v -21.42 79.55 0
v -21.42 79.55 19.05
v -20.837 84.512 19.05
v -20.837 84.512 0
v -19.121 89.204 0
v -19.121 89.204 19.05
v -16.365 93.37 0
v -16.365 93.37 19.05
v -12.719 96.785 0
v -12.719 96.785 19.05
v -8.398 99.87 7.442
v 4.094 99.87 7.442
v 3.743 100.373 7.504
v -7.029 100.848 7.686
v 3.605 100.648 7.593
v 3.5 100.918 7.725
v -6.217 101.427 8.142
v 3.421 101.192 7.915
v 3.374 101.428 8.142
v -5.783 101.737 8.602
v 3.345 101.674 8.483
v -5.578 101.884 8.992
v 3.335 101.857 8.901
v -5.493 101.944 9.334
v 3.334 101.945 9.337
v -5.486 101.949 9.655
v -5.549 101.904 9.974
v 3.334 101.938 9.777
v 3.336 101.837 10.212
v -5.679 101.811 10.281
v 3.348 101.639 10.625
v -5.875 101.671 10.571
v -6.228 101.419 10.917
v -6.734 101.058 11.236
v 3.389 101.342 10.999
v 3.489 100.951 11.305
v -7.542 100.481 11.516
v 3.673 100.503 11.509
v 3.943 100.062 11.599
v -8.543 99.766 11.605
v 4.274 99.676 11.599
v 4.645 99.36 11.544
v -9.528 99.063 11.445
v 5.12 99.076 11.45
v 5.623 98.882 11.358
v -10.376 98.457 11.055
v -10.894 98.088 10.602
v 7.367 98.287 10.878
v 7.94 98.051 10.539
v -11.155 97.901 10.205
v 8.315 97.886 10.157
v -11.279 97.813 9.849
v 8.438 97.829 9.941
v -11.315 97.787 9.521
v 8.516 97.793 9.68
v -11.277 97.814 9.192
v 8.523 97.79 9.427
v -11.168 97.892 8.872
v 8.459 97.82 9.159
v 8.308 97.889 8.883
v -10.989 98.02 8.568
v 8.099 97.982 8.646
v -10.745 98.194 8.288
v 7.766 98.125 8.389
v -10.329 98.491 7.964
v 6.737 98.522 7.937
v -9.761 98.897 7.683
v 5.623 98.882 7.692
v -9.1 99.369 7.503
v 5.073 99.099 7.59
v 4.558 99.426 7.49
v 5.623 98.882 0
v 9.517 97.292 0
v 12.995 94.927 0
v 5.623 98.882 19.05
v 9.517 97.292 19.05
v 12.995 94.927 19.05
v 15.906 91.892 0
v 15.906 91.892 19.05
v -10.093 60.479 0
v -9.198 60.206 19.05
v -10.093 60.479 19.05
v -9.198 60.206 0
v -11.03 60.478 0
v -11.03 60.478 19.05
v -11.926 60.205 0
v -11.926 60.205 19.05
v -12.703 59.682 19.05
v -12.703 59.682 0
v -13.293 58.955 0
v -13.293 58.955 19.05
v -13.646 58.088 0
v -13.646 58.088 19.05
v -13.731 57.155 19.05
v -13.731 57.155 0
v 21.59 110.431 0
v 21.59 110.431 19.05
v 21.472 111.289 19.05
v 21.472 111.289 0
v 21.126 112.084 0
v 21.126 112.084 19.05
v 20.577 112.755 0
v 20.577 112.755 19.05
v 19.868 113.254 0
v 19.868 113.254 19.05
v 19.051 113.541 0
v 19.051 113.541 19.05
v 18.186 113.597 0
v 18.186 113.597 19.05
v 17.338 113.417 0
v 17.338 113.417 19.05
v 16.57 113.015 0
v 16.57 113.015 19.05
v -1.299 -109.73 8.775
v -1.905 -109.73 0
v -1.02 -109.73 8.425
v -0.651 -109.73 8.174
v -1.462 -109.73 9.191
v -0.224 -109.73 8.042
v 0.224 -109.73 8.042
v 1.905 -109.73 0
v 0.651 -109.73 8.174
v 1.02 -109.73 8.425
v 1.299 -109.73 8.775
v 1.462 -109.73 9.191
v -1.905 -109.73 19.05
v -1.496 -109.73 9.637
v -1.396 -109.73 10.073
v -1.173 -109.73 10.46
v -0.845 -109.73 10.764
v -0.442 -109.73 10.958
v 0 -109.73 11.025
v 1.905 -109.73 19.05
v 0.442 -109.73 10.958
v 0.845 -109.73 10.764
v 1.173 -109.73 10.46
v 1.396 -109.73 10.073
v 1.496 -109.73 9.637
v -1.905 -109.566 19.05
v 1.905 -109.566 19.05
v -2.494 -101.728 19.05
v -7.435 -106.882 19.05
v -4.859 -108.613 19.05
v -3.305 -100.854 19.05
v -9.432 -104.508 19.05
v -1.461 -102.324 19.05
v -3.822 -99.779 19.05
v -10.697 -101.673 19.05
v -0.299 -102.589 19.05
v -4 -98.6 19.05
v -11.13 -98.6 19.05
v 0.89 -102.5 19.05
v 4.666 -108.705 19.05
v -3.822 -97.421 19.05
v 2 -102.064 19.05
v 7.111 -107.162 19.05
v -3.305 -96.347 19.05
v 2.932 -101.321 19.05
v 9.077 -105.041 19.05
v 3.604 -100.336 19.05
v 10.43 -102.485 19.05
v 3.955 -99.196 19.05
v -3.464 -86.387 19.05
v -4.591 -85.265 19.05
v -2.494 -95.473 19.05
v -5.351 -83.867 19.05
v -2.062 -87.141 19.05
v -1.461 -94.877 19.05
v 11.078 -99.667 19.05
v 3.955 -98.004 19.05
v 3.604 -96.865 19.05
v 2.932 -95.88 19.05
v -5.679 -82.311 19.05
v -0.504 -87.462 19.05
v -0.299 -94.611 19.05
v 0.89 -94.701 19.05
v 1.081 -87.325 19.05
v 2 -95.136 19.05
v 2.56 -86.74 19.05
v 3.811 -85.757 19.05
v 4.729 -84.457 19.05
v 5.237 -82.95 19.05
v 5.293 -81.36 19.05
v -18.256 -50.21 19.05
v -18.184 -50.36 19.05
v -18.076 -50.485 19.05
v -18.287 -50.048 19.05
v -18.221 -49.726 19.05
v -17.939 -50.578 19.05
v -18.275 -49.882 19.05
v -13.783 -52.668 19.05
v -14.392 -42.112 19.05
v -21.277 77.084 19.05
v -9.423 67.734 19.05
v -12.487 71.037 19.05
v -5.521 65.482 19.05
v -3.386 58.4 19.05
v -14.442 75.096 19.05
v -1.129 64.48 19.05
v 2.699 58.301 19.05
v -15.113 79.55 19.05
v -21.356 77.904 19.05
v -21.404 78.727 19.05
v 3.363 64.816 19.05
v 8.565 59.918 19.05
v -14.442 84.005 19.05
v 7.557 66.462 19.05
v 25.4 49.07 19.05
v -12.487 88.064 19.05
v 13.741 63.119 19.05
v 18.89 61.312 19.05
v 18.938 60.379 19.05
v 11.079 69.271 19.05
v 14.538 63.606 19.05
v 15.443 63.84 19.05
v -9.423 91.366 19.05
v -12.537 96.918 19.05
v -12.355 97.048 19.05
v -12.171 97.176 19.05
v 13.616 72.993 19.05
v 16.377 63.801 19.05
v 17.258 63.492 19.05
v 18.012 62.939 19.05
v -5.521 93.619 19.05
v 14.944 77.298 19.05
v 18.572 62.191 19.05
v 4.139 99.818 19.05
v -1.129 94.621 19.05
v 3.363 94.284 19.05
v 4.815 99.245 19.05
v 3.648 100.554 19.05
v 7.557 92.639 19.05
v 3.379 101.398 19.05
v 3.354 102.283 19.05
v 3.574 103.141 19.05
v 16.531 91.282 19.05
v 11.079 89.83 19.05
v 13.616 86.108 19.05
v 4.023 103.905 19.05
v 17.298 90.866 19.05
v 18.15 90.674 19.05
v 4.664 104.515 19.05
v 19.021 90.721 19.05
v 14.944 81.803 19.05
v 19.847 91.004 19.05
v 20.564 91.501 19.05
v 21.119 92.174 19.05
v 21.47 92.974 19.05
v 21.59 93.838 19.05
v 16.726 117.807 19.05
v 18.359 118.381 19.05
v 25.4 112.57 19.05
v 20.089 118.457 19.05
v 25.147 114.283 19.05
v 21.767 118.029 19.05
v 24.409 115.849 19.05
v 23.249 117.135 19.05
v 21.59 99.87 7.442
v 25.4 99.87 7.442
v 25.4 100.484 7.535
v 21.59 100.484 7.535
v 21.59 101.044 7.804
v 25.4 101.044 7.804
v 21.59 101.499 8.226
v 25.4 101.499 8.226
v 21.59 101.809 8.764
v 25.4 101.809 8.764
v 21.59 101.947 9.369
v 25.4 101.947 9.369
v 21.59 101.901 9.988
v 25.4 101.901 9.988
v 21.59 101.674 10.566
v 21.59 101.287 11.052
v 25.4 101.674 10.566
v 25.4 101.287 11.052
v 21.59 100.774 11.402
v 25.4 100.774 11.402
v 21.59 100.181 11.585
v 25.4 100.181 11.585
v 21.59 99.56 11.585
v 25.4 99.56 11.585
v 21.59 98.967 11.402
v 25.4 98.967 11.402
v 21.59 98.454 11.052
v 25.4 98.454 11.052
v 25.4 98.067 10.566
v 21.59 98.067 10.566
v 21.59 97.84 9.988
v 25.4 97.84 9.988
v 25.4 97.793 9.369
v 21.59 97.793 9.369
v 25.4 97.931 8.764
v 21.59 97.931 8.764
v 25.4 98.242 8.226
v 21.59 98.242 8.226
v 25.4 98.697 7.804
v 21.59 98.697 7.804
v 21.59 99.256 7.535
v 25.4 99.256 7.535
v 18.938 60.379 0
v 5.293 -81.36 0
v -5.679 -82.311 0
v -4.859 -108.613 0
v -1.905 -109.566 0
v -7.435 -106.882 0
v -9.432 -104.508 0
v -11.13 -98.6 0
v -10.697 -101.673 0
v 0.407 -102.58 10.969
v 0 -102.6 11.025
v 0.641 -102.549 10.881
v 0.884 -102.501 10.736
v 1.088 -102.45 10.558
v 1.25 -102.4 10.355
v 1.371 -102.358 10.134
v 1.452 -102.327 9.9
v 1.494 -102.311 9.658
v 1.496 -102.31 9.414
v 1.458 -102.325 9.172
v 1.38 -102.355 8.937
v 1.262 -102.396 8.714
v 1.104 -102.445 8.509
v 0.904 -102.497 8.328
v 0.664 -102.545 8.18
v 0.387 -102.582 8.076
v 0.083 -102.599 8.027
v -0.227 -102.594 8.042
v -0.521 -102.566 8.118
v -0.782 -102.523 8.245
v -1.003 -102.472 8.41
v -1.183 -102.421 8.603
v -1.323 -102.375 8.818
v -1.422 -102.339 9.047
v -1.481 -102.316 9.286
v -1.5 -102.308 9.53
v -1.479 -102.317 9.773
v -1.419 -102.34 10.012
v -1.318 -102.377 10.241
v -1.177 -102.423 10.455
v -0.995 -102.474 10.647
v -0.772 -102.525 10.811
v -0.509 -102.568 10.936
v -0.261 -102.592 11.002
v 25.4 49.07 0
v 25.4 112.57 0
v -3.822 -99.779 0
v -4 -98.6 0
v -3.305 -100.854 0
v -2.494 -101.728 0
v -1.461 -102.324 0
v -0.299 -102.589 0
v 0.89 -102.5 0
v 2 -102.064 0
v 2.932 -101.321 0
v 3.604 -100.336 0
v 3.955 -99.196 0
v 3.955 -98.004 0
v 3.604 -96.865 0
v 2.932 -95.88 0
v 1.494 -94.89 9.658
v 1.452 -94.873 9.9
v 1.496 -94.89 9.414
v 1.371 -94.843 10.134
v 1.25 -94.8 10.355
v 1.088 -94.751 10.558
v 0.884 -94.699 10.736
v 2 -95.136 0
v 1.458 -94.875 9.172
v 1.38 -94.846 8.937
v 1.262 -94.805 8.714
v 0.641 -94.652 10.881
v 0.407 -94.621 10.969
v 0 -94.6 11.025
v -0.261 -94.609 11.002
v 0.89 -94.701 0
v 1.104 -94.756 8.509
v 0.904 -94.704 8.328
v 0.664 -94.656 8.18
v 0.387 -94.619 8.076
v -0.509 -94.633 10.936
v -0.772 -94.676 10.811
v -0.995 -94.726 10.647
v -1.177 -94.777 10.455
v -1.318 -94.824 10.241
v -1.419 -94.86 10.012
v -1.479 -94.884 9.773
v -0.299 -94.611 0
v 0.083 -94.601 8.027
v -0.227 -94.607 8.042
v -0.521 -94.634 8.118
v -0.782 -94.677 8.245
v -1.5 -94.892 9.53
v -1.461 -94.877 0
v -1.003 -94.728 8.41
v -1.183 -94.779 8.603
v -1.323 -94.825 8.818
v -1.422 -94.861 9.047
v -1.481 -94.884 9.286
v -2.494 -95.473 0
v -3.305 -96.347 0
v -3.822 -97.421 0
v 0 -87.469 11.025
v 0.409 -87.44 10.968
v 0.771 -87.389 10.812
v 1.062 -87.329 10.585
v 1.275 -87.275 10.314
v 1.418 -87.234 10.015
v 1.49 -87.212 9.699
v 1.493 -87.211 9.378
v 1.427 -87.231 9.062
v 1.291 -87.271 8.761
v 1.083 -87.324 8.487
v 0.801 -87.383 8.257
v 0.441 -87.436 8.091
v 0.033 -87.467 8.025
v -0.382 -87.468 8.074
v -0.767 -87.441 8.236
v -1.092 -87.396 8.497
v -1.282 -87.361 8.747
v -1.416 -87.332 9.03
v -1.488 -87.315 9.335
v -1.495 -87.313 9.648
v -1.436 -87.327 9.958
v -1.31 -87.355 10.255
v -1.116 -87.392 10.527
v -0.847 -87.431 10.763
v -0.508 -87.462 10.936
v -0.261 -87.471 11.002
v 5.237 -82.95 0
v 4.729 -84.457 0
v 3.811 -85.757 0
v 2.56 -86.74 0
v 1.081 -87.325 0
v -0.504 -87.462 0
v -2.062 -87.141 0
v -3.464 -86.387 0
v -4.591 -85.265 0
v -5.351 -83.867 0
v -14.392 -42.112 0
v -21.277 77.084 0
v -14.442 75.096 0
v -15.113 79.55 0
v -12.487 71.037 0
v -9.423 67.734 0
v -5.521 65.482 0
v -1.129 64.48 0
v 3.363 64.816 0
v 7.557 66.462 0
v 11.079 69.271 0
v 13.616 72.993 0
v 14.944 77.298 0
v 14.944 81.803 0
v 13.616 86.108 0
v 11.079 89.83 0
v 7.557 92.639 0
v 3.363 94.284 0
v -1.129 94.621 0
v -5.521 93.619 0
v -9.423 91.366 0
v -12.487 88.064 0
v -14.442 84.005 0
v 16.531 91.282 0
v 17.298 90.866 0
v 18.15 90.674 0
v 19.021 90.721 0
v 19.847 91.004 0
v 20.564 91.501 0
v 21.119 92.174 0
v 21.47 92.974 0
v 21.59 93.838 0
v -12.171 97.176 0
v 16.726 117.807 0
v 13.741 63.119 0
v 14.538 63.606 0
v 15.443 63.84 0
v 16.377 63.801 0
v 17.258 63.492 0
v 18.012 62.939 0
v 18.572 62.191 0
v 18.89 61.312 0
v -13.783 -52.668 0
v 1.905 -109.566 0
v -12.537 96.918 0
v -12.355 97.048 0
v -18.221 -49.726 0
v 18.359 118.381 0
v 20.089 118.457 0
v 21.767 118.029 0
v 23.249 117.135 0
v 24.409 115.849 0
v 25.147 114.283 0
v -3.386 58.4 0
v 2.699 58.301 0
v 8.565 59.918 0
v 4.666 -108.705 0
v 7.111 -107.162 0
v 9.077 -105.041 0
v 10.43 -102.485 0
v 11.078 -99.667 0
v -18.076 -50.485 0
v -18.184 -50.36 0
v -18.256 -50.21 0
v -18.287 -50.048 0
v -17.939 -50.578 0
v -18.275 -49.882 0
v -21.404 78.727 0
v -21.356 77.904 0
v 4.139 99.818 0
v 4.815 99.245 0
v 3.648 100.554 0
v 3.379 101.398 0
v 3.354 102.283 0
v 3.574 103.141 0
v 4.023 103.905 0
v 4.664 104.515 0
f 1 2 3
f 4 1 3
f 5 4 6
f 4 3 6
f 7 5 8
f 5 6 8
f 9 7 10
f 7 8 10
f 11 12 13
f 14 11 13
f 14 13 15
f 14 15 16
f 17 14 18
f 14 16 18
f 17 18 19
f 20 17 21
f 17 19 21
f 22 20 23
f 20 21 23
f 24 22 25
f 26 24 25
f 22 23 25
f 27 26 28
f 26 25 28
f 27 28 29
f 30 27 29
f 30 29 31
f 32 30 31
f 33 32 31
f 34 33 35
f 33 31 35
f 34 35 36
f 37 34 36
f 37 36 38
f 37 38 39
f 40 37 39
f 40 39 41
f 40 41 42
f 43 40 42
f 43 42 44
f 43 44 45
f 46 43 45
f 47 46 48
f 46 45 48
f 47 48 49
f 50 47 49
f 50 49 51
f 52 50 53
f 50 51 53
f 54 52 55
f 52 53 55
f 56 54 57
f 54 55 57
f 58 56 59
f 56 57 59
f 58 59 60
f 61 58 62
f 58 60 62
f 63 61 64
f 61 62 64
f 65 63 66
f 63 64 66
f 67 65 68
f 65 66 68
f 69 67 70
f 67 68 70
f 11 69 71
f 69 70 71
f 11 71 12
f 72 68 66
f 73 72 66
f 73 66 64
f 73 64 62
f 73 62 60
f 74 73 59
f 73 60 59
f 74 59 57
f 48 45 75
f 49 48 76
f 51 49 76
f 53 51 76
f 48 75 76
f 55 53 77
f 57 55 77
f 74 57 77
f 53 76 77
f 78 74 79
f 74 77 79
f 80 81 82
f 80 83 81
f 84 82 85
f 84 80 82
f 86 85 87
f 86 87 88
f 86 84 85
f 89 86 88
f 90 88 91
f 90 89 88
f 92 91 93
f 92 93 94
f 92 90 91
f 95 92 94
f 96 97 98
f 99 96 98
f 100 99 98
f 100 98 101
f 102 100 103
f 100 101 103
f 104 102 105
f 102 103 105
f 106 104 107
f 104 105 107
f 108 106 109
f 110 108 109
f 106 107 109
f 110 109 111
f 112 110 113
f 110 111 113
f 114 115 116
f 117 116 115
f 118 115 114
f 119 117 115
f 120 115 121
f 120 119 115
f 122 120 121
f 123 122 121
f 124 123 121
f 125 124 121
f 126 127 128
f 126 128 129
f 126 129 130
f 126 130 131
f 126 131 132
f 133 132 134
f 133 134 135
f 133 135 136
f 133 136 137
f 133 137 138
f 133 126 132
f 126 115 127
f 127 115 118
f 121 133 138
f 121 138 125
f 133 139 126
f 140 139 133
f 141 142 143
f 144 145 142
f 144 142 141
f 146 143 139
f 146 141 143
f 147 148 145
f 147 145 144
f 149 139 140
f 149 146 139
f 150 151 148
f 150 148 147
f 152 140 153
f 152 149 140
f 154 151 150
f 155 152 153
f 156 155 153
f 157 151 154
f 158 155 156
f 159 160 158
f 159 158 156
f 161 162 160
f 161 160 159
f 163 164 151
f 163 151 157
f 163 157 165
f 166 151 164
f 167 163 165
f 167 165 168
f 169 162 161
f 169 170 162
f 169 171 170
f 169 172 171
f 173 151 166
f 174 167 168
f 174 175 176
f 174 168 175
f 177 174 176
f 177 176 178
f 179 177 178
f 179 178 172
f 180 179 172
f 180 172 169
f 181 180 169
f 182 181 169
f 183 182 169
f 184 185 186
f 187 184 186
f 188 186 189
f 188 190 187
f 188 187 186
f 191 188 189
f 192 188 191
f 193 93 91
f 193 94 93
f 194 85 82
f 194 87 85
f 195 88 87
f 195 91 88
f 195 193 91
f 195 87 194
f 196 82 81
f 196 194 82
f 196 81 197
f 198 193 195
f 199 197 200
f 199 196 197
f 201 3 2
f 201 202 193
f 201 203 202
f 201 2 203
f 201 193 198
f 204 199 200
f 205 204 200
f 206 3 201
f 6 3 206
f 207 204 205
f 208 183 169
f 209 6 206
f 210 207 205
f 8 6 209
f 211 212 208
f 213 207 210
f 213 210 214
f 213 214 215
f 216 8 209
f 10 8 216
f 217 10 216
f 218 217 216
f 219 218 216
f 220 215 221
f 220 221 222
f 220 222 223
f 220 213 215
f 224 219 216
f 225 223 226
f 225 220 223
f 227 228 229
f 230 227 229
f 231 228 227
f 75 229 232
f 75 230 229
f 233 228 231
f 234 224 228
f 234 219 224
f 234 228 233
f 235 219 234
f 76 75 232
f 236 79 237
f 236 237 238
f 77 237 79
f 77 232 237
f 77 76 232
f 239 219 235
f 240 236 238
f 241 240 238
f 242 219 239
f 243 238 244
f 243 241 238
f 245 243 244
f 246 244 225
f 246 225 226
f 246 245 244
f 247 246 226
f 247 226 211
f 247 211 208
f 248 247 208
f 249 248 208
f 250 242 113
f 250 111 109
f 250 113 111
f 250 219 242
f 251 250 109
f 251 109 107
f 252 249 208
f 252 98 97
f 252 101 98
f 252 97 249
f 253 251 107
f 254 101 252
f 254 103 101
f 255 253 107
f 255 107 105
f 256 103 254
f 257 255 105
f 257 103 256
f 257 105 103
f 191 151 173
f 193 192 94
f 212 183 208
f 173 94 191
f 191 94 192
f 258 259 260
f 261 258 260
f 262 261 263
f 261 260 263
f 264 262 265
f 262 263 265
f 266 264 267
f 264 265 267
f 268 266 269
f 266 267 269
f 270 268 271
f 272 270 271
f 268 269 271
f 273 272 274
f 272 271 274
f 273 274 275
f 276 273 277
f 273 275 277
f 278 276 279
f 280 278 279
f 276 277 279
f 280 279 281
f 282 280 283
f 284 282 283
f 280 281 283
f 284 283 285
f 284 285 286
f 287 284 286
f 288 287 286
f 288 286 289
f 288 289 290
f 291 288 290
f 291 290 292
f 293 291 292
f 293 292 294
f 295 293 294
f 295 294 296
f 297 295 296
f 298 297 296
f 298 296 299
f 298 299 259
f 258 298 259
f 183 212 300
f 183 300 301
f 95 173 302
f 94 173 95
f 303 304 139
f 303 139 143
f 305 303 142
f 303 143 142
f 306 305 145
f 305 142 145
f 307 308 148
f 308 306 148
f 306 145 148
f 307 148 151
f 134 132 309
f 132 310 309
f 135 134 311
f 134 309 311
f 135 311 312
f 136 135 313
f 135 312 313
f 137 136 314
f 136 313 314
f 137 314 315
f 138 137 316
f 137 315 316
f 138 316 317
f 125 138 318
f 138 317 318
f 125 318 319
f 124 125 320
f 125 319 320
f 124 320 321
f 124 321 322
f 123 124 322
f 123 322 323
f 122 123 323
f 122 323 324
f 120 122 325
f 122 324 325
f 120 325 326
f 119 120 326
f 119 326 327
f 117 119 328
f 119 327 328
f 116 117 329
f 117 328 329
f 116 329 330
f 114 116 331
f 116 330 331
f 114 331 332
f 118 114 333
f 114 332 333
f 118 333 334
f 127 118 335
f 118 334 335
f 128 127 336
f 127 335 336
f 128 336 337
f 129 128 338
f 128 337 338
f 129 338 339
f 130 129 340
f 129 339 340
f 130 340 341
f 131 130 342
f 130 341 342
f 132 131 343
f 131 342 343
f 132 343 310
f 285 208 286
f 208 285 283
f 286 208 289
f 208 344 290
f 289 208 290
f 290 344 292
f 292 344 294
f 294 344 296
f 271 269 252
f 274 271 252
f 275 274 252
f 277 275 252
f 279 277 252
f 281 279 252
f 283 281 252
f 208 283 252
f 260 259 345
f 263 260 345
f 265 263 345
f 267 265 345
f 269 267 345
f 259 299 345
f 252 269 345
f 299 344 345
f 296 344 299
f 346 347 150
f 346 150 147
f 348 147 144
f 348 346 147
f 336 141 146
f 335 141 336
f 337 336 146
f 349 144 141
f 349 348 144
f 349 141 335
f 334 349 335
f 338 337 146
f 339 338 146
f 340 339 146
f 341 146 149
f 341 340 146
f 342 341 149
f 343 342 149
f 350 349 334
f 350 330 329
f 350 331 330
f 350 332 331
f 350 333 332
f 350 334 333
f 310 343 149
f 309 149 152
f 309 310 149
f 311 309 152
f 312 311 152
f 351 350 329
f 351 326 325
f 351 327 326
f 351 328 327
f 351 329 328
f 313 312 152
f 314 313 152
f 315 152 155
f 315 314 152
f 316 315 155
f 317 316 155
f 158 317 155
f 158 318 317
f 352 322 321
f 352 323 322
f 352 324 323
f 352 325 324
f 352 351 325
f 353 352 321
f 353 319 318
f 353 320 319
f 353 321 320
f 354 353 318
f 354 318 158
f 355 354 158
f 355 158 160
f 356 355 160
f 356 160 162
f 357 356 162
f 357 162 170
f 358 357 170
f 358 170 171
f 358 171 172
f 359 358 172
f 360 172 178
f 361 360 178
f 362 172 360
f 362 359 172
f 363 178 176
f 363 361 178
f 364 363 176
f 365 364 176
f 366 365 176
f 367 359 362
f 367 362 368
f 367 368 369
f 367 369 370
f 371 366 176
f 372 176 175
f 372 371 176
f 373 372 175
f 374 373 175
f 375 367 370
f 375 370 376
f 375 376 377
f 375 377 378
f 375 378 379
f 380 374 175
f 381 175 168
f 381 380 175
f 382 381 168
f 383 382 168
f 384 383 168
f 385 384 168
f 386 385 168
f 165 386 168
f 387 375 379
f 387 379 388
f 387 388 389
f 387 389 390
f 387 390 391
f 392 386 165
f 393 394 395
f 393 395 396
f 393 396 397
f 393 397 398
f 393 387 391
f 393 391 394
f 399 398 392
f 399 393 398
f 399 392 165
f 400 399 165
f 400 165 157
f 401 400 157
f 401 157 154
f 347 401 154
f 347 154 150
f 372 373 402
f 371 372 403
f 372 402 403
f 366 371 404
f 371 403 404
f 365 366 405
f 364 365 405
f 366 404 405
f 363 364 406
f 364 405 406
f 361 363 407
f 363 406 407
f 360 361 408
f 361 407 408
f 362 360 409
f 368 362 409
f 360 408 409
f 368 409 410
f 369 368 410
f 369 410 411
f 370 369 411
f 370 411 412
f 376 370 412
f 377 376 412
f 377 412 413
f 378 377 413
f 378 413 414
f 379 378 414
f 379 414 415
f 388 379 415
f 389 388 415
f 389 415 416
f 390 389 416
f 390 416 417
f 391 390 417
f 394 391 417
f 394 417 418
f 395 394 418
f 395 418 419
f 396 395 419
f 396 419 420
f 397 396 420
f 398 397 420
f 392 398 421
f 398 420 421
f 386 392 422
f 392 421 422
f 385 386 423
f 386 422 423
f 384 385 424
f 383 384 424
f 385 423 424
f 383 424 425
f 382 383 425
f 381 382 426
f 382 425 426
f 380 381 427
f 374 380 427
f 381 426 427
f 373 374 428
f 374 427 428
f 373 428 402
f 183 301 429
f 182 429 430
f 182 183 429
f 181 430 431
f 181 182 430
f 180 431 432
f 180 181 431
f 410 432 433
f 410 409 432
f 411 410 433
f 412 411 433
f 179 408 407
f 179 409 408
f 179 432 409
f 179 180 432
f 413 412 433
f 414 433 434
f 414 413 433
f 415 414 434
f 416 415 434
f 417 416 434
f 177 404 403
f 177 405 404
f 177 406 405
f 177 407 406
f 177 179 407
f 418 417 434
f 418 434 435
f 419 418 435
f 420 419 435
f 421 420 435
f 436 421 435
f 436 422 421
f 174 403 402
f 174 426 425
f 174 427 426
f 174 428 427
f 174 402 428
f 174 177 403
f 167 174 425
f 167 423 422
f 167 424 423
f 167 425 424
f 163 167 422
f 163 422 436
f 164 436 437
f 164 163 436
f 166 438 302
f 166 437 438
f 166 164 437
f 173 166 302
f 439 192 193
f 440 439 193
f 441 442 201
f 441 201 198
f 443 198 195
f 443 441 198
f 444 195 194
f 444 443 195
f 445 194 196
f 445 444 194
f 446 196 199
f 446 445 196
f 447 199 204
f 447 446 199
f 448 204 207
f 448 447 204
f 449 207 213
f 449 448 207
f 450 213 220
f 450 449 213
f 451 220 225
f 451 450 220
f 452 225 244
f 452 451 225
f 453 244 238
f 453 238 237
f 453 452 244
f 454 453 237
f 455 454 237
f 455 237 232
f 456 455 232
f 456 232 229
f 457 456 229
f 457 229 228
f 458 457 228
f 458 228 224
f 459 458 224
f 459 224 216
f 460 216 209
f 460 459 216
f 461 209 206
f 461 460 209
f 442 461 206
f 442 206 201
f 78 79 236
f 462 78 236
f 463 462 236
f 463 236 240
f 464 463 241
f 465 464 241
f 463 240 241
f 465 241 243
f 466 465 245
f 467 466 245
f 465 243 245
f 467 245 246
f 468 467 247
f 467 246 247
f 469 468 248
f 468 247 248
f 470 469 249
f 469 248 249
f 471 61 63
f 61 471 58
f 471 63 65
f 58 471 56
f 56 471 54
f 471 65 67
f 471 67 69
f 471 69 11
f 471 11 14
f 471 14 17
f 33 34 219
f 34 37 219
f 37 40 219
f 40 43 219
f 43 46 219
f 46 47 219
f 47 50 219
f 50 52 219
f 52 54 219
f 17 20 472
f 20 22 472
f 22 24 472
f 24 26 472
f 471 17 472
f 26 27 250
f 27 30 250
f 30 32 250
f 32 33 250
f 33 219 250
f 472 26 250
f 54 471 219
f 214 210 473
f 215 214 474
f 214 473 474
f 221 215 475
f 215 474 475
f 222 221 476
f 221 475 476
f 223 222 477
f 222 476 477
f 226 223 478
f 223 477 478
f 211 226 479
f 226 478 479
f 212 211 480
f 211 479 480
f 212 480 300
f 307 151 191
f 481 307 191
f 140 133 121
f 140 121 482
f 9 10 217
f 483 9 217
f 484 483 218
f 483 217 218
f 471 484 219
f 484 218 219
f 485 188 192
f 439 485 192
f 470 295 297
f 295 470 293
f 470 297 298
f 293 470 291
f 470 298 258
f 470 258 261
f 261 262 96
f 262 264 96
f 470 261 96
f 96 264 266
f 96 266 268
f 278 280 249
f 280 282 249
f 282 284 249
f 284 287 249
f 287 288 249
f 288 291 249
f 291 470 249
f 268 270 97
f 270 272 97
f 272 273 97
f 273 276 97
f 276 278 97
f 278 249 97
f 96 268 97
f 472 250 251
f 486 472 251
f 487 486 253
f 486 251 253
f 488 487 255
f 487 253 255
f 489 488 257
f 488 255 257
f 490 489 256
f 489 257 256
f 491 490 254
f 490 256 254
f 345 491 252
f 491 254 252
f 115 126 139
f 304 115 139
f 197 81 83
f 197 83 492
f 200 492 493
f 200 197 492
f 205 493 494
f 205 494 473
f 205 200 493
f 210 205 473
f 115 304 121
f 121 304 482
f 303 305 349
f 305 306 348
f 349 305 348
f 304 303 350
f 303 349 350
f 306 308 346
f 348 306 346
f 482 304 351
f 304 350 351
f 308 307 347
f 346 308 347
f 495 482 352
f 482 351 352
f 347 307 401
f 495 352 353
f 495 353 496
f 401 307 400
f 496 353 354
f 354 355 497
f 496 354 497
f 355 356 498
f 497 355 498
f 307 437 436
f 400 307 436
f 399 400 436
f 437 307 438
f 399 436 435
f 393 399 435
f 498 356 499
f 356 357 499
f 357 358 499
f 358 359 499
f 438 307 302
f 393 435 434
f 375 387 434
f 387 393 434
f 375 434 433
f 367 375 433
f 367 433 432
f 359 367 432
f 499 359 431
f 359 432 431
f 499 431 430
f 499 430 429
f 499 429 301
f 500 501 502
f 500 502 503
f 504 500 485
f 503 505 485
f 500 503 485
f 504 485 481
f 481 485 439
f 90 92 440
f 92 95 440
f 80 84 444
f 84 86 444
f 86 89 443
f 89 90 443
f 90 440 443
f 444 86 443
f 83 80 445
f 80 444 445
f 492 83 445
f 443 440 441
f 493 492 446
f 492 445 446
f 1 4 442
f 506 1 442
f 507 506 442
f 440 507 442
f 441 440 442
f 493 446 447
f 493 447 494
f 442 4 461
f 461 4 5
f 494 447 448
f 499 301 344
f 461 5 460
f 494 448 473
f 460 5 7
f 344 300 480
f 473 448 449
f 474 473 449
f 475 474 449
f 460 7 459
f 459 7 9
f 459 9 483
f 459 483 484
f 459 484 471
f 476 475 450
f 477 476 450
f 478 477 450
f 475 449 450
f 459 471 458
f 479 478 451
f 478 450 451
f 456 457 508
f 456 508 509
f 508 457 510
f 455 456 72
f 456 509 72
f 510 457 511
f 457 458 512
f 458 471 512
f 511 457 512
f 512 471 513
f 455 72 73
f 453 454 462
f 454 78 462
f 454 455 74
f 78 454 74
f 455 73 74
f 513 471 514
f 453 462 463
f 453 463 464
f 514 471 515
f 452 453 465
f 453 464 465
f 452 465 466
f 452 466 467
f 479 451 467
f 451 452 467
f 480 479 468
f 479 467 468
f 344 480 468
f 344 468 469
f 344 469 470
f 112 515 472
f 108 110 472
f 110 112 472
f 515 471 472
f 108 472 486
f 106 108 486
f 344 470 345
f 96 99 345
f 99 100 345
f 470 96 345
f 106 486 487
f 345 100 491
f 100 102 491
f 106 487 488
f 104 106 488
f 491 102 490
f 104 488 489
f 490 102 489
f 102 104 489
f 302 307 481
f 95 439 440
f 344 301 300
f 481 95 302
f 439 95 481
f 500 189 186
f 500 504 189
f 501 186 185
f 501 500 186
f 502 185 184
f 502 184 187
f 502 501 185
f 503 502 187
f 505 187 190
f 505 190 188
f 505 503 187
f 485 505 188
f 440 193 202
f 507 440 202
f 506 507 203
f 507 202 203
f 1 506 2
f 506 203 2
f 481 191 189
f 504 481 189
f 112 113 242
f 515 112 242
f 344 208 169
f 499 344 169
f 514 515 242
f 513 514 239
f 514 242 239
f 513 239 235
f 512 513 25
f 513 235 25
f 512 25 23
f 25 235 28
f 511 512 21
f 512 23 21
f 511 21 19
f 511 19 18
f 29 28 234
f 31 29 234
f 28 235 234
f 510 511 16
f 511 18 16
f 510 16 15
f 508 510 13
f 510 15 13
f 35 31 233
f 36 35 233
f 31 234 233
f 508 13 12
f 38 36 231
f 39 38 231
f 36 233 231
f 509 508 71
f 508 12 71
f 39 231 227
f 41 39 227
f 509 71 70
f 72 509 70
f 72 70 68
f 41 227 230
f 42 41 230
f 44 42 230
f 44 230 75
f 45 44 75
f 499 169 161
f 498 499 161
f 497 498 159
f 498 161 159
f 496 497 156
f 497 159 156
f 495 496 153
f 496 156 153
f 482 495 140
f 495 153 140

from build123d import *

# Parameters (mm, degrees)
SKETCH1_W           = 50.8
SKETCH1_H           = 248.000519746
SKETCH1_R           = 4.0000047
SKETCH1_R_2         = 15.113
BOSS_EXTRUDE1_DEPTH = 19.05
CUT_EXTRUDE1_REACH  = 137.35
SKETCH3_R           = 2.0828
CUT_EXTRUDE2_REACH  = 130
FILLET2_R           = 3.175
FILLET3_R           = 3.175
CUT_EXTRUDE3_REACH  = 124.668
SKETCH8_R           = 1.500000048
CUT_EXTRUDE4_REACH  = 124.668
SKETCH12_W          = 3.81
SKETCH12_H          = 6.719538638
BOSS_EXTRUDE3_DEPTH = 19.05
SKETCH14_R          = 1.500000048
CUT_EXTRUDE5_DEPTH  = 109.729869862
BOSS_EXTRUDE5_DEPTH = 19.05
FILLET4_R           = 0.635


with BuildPart() as part:
    # Sketch1 → Boss-Extrude1 (new body)
    with BuildSketch(Plane.XY):
        Rectangle(SKETCH1_W, SKETCH1_H)
        with Locations(Location((0, -98.600259873, 0), (0, 0, 180))):
            Circle(SKETCH1_R, mode=Mode.SUBTRACT)
        with Locations(Location((0, 79.550259873, 0), (0, 0, 180))):
            Circle(SKETCH1_R_2, mode=Mode.SUBTRACT)
    extrude(amount=BOSS_EXTRUDE1_DEPTH)

    # Sketch3 → Cut-Extrude1 (cut, up to next)
    with BuildSketch(Plane(origin=(25.4, 0, 0), x_dir=(0, 0, -1), z_dir=(1, 0, 0)), mode=Mode.PRIVATE) as cut_extrude1_sk1:
        with Locations((-9.525, 99.870259873)):
            Circle(SKETCH3_R)
    cut_extrude1_tool1 = extrude(cut_extrude1_sk1.sketch, amount=-CUT_EXTRUDE1_REACH, mode=Mode.PRIVATE) & part.part
    add(cut_extrude1_tool1.solids().sort_by_distance((25.4, 99.87026, 9.525))[0], mode=Mode.SUBTRACT)

    # Sketch4 → Cut-Extrude2 (cut, up to next)
    with BuildSketch(Plane.XY.offset(19.05), mode=Mode.PRIVATE) as cut_extrude2_sk1:
        with BuildLine():
            Line((25.4, -124.000259873), (25.4, 49.070259873))
            Line((25.4, 49.070259873), (11.078372462, -99.666975439))
            ThreePointArc((11.078372462, -99.666975439), (-0.533972701, -109.7170531), (-11.129609989, -98.600259873))
            Line((-11.129609989, -98.600259873), (-21.277335587, 77.084025085))
            ThreePointArc((-21.277335587, 77.084025085), (-21.384145342, 78.315087136), (-21.419788134, 79.550259873))
            ThreePointArc((-21.419788134, 79.550259873), (-19.121183474, 89.203635773), (-12.718706155, 96.785161597))
            ThreePointArc((-12.718706155, 96.785161597), (-12.44619853, 96.982972395), (-12.170614954, 97.176474877))
            Line((-12.170614954, 97.176474877), (16.725657691, 117.807156743))
            Line((16.725657691, 117.807156743), (25.4, 124.000259873))
            Line((25.4, 124.000259873), (-25.4, 124.000259873))
            Line((-25.4, 124.000259873), (-25.4, -124.000259873))
            Line((-25.4, -124.000259873), (25.4, -124.000259873))
        make_face()
    cut_extrude2_tool1 = extrude(cut_extrude2_sk1.sketch, amount=-CUT_EXTRUDE2_REACH, mode=Mode.PRIVATE) & part.part
    # Sketch4 → Cut-Extrude2 (cut, up to next)
    with BuildSketch(Plane.XY.offset(19.05), mode=Mode.PRIVATE) as cut_extrude2_sk2:
        with BuildLine():
            ThreePointArc((16.725657691, 117.807156743), (22.540648101, 117.636552978), (25.4, 112.570259873))
            Line((25.4, 112.570259873), (25.4, 124.000259873))
            Line((25.4, 124.000259873), (16.725657691, 117.807156743))
        make_face()
    cut_extrude2_tool2 = extrude(cut_extrude2_sk2.sketch, amount=-CUT_EXTRUDE2_REACH, mode=Mode.PRIVATE) & part.part
    # Sketch4 → Cut-Extrude2 (cut, up to next)
    with BuildSketch(Plane.XY.offset(19.05), mode=Mode.PRIVATE) as cut_extrude2_sk3:
        with BuildLine():
            ThreePointArc((5.292525145, -81.359808555), (0.293269038, -87.451084718), (-5.679257035, -82.310545911))
            Line((-5.679257035, -82.310545911), (-14.092209721, 63.41901848))
            ThreePointArc((-14.092209721, 63.41901848), (5.243866663, 58.78227523), (20.060972069, 72.042615545))
            Line((20.060972069, 72.042615545), (5.292525145, -81.359808555))
        make_face()
    cut_extrude2_tool3 = extrude(cut_extrude2_sk3.sketch, amount=-CUT_EXTRUDE2_REACH, mode=Mode.PRIVATE) & part.part
    add(cut_extrude2_tool1.solids().sort_by_distance((22.8685, -37.465, 19.05))[0], mode=Mode.SUBTRACT)
    add(cut_extrude2_tool2.solids().sort_by_distance((23.100822, 119.489273, 19.05))[0], mode=Mode.SUBTRACT)
    add(cut_extrude2_tool3.solids().sort_by_distance((1.517355, 0.15341, 19.05))[0], mode=Mode.SUBTRACT)

    # Fillet2
    fillet2_edges = [part.edges().sort_by_distance(p)[0] for p in [
        (-14.092209721, 63.41901848, 9.525),
    ]]
    fillet(fillet2_edges, radius=FILLET2_R)

    # Fillet3
    fillet3_edges = [part.edges().sort_by_distance(p)[0] for p in [
        (20.060972069, 72.042615545, 9.525),
    ]]
    fillet(fillet3_edges, radius=FILLET3_R)

    # Sketch8 → Cut-Extrude3 (cut, up to next)
    with BuildSketch(Plane(origin=(0, 0, 0), x_dir=(1, 0, 0), z_dir=(0, 1, 0)), mode=Mode.PRIVATE) as cut_extrude3_sk1:
        with Locations(Location((0, -9.525, 0), (0, 0, 270))):
            Circle(SKETCH8_R)
    cut_extrude3_tool1 = extrude(cut_extrude3_sk1.sketch, amount=-CUT_EXTRUDE3_REACH, mode=Mode.PRIVATE) & part.part
    add(cut_extrude3_tool1.solids().sort_by_distance((0, 0, 9.525))[0], mode=Mode.SUBTRACT)
    add(cut_extrude3_tool1.solids().sort_by_distance((0, 0, 9.525))[1], mode=Mode.SUBTRACT)

    # Sketch9 → Cut-Extrude4 (cut, up to next)
    with BuildSketch(Plane.XY.offset(19.05), mode=Mode.PRIVATE) as cut_extrude4_sk1:
        with BuildLine():
            Line((21.59, 93.837951404), (21.59, 110.430718326))
            ThreePointArc((21.59, 110.430718326), (19.868129262, 113.2536672), (16.570132064, 113.014724382))
            Line((16.570132064, 113.014724382), (4.664459855, 104.514592245))
            ThreePointArc((4.664459855, 104.514592245), (3.379291217, 101.398142719), (5.622621351, 98.88191817))
            ThreePointArc((5.622621351, 98.88191817), (11.317754993, 96.200644412), (15.90649227, 91.891669316))
            ThreePointArc((15.90649227, 91.891669316), (19.443618723, 90.834192339), (21.59, 93.837951404))
        make_face()
    cut_extrude4_tool1 = extrude(cut_extrude4_sk1.sketch, amount=-CUT_EXTRUDE4_REACH, mode=Mode.PRIVATE) & part.part
    add(cut_extrude4_tool1.solids().sort_by_distance((14.719372, 102.332166, 19.05))[0], mode=Mode.SUBTRACT)

    # Sketch12 → Boss-Extrude3 (add)
    with BuildSketch(Plane.XY.offset(19.05)):
        with Locations((0, -106.370100543)):
            Rectangle(SKETCH12_W, SKETCH12_H)
    extrude(amount=-BOSS_EXTRUDE3_DEPTH)

    # Sketch14 → Cut-Extrude5 (cut)
    with BuildSketch(Plane(origin=(0, 0, 0), x_dir=(1, 0, 0), z_dir=(0, 1, 0))):
        with Locations(Location((0, -9.525, 0), (0, 0, 270))):
            Circle(SKETCH14_R)
    extrude(amount=-CUT_EXTRUDE5_DEPTH, mode=Mode.SUBTRACT)

    # Sketch17 → Boss-Extrude5 (add)
    with BuildSketch(Plane.XY.offset(19.05)):
        Polygon((-14.392423467, -42.112227423), (-13.782717735, -52.66786519), (-18.505869398, -50.292966075), align=None)
    extrude(amount=-BOSS_EXTRUDE5_DEPTH)

    # Fillet4
    fillet4_edges = [part.edges().sort_by_distance(p)[0] for p in [
        (-18.505869398, -50.292966075, 9.525),
    ]]
    fillet(fillet4_edges, radius=FILLET4_R)


solid = part.part
